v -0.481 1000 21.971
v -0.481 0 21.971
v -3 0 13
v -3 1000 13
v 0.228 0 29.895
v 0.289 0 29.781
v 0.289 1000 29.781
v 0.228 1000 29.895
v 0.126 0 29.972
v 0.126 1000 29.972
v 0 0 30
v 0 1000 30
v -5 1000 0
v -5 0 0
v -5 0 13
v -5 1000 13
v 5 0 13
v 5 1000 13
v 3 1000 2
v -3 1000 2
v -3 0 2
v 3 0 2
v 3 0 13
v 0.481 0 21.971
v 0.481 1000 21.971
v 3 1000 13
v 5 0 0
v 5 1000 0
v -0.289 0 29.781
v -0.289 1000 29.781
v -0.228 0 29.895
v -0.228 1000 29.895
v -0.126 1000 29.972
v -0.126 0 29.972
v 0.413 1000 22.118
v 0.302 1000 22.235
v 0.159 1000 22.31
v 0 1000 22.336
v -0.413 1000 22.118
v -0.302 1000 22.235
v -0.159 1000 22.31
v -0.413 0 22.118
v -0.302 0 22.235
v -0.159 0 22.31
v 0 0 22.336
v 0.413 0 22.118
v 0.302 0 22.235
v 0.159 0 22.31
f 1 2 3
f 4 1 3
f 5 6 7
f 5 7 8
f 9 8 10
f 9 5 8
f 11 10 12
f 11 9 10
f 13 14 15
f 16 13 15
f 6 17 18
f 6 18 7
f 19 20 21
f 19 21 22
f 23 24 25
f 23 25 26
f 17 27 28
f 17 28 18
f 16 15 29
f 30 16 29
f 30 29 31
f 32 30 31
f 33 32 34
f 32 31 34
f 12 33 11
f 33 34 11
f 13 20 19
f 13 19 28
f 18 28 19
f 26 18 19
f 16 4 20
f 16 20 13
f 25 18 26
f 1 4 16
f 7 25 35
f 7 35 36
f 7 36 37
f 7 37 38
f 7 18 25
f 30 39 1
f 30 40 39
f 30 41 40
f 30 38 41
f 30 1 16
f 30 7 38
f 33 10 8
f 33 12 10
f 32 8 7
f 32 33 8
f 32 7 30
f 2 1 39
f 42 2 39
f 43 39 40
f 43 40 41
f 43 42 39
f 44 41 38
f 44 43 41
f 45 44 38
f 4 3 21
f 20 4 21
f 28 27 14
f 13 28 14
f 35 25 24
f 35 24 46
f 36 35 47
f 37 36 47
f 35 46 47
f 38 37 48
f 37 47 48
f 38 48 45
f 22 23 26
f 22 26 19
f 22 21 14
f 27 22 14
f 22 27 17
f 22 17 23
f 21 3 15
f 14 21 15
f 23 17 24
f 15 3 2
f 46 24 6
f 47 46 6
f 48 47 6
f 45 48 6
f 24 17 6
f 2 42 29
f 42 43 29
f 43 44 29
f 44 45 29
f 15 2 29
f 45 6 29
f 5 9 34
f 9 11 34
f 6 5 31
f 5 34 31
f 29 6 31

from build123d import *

# Parameters (mm, degrees)
PAD_DEPTH = 1000


with BuildPart() as part:
    # Sketch → Pad (new body)
    with BuildSketch(Plane.XZ):
        with BuildLine():
            Line((0, 0), (5, 0))
            Line((5, 0), (5, 13))
            Line((5, 13), (0.288833, 29.781088))
            ThreePointArc((0.288833, 29.781088), (0.181209, 29.939088), (0, 30))
            Line((0, 22.336099), (0, 30))
            ThreePointArc((0.481389, 21.971245), (0.302016, 22.234579), (0, 22.336099))
            Line((0.481389, 21.971245), (3, 13))
            Line((3, 13), (3, 2))
            Line((3, 2), (0, 2))
            Line((0, 2), (0, 0))
        make_face()
    pad = extrude(amount=-PAD_DEPTH)

    # Mirrored: Pad across Sketch V_Axis
    add(pad.mirror(Plane(origin=(0, 0, 0), x_dir=(0, -1, 0), z_dir=(1, 0, 0))))


solid = part.part
